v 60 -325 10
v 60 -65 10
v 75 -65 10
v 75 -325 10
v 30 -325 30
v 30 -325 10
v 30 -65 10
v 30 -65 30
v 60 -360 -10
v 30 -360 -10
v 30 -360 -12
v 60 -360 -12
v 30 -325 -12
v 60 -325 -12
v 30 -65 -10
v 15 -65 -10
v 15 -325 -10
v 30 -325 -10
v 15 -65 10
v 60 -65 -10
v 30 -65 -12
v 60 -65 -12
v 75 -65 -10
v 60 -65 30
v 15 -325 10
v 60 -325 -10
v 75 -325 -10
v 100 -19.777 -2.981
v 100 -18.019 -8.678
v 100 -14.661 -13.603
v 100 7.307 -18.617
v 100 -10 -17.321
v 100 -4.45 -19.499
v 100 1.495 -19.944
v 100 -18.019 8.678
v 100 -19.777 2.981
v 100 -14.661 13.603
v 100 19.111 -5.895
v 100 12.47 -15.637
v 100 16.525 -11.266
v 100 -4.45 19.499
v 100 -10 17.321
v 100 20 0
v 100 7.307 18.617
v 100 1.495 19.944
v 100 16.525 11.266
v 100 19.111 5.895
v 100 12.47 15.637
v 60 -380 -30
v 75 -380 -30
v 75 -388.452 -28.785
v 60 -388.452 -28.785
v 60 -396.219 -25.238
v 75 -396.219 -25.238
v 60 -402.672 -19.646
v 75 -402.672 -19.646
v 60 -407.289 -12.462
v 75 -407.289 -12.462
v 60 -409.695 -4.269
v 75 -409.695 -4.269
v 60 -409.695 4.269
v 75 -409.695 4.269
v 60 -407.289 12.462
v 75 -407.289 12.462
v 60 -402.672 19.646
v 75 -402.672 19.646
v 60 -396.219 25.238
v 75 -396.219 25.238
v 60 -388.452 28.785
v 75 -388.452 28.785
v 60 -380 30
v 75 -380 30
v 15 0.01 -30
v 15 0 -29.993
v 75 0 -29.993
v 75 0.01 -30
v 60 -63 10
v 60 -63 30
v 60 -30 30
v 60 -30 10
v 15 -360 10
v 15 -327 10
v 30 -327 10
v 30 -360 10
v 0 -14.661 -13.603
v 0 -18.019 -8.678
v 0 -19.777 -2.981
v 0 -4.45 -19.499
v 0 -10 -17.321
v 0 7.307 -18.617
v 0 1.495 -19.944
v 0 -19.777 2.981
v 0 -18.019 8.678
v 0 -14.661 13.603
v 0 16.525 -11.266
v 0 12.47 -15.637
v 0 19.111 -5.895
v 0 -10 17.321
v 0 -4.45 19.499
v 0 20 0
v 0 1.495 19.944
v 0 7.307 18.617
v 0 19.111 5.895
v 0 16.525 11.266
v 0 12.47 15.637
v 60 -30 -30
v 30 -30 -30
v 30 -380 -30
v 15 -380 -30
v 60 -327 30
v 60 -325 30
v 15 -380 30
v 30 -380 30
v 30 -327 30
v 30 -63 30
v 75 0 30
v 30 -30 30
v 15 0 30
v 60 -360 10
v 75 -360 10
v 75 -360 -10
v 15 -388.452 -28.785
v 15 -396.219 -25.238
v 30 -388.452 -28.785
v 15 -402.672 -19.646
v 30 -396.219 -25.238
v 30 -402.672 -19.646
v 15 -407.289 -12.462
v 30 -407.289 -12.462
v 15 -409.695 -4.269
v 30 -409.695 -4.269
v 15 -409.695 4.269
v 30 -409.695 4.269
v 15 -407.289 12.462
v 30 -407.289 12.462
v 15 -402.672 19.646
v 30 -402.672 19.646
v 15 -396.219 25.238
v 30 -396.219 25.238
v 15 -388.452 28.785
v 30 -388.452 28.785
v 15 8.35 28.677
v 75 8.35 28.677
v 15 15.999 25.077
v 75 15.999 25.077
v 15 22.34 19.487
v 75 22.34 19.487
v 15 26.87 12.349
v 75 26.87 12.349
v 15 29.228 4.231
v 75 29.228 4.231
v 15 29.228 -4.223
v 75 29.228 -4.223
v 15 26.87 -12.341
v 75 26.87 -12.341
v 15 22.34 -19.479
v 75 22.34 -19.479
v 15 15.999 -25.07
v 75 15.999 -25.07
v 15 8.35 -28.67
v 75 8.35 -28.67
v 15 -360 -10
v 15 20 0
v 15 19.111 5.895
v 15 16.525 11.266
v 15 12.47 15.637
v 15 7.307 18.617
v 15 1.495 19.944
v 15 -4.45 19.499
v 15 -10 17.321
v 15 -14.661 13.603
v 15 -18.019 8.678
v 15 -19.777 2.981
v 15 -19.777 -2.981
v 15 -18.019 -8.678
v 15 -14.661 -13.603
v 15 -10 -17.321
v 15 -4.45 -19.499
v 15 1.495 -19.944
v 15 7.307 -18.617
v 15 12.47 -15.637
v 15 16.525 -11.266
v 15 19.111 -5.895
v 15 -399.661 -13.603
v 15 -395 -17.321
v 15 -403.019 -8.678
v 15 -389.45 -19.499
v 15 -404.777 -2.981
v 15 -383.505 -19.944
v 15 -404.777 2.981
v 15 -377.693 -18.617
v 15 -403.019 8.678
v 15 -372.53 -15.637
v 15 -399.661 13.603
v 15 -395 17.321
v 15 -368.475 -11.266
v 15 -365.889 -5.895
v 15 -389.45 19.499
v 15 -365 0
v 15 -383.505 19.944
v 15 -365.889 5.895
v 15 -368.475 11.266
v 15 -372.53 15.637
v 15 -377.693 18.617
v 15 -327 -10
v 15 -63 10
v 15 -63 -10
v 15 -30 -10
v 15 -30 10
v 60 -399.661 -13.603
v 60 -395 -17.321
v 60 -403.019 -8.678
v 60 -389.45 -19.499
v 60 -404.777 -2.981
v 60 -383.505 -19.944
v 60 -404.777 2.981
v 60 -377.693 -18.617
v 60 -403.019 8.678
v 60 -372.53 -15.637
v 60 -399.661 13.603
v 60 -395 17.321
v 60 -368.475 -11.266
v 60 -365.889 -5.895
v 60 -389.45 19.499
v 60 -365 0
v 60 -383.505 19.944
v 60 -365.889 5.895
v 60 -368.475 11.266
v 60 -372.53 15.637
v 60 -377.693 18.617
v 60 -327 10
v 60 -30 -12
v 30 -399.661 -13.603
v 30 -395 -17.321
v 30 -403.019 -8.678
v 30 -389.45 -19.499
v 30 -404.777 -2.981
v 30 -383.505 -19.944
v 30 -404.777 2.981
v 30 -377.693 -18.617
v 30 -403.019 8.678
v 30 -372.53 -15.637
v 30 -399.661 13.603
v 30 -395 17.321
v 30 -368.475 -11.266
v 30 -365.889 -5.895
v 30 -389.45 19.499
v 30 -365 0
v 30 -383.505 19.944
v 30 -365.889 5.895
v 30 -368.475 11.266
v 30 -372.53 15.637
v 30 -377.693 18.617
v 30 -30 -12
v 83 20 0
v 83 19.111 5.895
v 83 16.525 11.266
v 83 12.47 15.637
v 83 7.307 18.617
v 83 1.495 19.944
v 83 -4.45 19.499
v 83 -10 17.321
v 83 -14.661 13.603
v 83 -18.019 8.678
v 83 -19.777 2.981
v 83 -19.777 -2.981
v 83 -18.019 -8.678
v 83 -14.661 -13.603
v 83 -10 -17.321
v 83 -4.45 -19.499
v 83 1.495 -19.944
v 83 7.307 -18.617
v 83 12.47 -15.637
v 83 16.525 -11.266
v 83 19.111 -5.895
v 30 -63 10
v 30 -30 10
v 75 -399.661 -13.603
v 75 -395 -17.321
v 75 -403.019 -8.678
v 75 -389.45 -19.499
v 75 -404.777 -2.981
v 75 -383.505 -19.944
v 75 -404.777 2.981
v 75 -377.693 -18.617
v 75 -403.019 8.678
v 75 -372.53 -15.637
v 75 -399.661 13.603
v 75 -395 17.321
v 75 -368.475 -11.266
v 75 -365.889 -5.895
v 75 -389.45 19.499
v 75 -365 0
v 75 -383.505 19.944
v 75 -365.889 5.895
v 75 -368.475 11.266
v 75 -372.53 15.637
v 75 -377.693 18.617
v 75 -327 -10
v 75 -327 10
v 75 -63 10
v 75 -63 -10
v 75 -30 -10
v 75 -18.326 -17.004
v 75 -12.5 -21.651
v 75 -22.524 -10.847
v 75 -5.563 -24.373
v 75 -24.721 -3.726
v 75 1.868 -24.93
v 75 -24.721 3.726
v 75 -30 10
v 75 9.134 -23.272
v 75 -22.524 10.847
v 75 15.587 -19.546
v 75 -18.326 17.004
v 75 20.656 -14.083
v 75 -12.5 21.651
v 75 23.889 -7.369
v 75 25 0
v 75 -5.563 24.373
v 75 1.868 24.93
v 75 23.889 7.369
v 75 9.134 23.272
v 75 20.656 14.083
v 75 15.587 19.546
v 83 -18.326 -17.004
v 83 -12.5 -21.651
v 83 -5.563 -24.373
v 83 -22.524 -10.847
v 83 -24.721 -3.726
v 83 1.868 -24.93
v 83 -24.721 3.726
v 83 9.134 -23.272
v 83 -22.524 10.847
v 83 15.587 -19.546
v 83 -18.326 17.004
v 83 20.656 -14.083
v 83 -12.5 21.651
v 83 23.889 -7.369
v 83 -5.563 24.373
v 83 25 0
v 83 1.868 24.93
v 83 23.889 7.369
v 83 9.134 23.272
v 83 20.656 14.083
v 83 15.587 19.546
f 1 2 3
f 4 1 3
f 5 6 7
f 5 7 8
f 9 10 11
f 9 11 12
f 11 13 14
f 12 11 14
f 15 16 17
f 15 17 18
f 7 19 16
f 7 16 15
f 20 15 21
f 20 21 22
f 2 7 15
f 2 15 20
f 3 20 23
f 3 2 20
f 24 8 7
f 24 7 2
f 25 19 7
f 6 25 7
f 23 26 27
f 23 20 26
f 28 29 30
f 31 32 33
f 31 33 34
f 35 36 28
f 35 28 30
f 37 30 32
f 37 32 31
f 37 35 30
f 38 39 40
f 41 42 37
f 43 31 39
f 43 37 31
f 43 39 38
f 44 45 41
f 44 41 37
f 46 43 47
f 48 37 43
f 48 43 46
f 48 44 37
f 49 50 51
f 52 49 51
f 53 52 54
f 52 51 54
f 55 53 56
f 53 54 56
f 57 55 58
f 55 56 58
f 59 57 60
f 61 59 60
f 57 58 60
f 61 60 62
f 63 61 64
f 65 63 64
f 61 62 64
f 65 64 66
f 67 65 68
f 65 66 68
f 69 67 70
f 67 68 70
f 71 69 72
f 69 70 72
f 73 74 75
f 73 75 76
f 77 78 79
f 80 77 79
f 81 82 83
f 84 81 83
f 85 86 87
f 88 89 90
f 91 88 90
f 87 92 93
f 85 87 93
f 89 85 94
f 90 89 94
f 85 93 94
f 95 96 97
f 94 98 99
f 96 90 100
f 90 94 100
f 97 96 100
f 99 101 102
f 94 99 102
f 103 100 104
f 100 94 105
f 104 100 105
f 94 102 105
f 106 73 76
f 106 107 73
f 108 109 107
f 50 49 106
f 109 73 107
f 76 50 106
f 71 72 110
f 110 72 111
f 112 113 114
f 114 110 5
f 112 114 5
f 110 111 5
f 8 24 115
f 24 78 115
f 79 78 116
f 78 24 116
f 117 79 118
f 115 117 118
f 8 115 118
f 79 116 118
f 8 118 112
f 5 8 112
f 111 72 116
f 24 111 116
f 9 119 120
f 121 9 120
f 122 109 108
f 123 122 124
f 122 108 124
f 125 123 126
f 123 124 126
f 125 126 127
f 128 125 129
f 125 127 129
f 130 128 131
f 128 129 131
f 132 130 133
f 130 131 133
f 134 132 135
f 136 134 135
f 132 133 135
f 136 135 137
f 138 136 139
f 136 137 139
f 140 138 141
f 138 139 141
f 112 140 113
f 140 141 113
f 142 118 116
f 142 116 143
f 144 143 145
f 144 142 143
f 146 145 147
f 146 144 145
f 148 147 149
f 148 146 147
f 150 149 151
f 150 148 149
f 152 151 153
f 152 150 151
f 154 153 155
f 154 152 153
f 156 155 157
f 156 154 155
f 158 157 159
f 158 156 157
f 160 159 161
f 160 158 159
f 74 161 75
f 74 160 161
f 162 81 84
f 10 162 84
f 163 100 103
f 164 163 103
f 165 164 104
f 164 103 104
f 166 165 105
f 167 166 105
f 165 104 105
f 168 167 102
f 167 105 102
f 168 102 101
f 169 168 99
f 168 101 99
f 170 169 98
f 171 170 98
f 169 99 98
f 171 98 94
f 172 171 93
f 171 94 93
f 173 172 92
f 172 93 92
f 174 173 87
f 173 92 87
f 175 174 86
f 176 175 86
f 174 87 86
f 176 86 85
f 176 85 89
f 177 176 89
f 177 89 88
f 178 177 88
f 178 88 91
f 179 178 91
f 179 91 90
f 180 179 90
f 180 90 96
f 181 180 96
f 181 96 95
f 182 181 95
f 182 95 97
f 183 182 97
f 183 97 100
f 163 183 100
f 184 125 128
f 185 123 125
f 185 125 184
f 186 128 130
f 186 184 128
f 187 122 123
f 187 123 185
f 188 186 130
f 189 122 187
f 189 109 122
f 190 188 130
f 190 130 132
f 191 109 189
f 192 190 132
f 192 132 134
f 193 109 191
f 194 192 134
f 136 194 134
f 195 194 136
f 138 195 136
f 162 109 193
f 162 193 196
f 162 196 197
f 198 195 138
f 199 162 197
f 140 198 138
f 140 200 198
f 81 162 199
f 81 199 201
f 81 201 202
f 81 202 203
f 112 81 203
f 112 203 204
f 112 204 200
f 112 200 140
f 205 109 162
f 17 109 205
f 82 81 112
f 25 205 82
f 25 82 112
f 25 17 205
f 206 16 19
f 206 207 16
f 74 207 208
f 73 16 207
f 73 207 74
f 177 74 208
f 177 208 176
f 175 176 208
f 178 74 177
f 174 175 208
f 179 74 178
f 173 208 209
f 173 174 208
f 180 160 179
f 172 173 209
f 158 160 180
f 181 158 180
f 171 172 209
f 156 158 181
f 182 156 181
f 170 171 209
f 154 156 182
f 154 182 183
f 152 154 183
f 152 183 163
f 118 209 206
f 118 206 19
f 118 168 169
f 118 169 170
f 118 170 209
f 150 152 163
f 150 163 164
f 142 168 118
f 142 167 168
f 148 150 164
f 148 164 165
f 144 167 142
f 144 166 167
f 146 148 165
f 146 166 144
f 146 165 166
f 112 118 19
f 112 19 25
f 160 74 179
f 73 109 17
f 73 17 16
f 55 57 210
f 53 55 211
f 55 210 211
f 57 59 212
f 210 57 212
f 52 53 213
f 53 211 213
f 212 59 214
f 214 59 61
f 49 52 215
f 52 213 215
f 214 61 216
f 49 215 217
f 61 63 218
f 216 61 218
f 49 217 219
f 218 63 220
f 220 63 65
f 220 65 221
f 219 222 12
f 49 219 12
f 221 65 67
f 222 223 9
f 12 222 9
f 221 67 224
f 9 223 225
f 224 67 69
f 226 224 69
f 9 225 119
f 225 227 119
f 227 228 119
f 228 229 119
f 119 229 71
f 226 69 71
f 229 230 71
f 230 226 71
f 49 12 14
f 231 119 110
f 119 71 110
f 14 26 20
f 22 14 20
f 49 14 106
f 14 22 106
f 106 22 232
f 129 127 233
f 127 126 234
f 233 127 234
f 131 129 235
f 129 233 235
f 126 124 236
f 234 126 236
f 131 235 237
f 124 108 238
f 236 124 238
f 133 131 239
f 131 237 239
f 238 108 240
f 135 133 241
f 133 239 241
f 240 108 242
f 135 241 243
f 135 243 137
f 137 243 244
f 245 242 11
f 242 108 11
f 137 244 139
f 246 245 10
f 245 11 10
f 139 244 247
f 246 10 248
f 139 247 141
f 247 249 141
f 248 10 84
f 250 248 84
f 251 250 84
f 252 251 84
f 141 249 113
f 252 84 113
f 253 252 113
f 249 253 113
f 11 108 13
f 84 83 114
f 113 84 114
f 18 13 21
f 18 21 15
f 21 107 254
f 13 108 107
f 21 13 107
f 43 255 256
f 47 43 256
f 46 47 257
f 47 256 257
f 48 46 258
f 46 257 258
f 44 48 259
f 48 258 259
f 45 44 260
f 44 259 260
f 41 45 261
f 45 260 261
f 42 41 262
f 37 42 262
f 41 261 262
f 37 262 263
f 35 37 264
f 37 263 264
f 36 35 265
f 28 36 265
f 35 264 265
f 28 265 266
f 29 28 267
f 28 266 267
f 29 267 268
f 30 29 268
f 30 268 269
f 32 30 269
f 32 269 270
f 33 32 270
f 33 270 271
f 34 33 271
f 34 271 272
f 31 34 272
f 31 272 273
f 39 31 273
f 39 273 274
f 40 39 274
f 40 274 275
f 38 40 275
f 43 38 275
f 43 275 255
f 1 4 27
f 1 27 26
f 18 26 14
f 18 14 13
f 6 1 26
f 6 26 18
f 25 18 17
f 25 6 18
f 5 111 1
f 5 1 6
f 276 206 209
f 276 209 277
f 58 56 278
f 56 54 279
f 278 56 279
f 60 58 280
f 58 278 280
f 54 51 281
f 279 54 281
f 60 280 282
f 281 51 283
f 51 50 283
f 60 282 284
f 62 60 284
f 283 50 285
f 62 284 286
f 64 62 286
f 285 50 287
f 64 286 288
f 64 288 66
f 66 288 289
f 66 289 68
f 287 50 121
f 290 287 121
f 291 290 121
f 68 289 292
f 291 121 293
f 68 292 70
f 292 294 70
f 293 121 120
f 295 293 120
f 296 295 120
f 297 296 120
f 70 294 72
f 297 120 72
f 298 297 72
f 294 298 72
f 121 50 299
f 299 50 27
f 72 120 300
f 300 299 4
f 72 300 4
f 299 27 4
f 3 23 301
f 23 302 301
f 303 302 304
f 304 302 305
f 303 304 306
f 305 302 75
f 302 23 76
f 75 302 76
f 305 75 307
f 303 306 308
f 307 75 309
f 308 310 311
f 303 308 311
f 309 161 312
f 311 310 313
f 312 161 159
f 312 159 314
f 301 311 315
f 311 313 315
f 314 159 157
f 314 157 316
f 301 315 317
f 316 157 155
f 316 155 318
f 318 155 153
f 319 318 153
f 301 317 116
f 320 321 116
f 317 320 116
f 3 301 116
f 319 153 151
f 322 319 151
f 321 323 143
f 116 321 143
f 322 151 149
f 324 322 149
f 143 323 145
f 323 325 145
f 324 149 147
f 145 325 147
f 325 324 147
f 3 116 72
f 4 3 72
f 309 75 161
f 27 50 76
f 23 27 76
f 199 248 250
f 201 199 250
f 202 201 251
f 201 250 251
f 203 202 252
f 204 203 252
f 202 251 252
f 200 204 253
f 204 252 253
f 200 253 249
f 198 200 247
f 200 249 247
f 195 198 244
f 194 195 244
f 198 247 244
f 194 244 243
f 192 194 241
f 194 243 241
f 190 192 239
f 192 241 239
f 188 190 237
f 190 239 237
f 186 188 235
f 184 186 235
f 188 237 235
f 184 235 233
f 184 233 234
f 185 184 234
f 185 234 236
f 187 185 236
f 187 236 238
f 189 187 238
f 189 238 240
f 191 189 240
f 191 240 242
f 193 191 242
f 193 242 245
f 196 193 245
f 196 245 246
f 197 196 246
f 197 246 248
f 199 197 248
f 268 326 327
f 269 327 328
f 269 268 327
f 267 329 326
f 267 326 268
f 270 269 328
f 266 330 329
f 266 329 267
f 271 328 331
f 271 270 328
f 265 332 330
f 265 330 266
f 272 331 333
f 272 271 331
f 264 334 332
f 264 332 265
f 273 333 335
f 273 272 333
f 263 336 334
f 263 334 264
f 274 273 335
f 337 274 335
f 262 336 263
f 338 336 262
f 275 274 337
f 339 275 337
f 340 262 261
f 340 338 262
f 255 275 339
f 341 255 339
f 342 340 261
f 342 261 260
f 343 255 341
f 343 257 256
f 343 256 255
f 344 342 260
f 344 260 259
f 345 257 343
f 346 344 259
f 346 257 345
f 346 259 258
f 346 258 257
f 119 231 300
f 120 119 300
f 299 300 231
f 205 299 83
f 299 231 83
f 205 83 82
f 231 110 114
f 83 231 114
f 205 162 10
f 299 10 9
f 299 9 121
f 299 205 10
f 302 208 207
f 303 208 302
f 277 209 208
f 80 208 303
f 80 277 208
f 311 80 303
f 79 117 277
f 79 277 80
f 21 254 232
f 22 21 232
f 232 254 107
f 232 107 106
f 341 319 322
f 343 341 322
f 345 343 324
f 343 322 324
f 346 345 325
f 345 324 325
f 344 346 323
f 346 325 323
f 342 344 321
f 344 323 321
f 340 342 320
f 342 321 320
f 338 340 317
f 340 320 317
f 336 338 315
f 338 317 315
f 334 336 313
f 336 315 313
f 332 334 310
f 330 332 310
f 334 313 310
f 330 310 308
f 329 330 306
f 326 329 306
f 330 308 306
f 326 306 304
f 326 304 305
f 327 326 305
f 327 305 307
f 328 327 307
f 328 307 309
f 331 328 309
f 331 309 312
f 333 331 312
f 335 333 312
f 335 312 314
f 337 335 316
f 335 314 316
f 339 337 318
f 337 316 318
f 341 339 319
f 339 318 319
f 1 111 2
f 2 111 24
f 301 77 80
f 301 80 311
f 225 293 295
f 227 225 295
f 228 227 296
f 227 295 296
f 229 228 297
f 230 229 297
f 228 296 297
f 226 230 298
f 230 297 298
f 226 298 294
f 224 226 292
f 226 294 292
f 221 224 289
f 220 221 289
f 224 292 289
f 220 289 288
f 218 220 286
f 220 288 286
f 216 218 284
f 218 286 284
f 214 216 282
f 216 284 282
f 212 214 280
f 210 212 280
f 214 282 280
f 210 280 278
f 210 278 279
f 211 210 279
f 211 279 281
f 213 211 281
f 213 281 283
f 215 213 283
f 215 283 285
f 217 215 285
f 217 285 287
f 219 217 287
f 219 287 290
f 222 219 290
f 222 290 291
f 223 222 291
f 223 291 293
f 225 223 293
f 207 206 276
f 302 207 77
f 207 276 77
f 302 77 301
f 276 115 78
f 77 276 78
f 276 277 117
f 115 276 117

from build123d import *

# Parameters (mm, degrees)
F0_R          = 20
F1_DEPTH      = 100
F2_W          = 60
F2_H          = 60
F3_DEPTH      = 30
F3_DEPTH_BACK = 40
F4_W          = 15
F4_H          = 20
F5_DEPTH      = 380
F6_W          = 15
F6_H          = 50
F7_DEPTH      = 50
F8_R          = 20
F9_DEPTH      = 75.001
F11_DEPTH     = 75.001
F13_DEPTH     = 100.001
F14_R         = 25
F15_DEPTH     = 8
F16_W         = 60
F16_H         = 35
F17_DEPTH     = 2
F18_W         = 60
F18_H         = 42
F19_DEPTH     = 2
F20_W         = 60
F20_H         = 35
F21_DEPTH     = 2
F22_W         = 60
F22_H         = 40
F23_DEPTH     = 2


with BuildPart() as f1:
    # F0 (on Right) → F1 (new body)
    with BuildSketch(Plane.YZ):
        Circle(F0_R)
    extrude(amount=F1_DEPTH)

    # F2 (on Front) → F3 (join, two sides)
    with BuildSketch(Plane.XZ) as f3_sk:
        with Locations((45, 0)):
            Rectangle(F2_W, F2_H)
    extrude(amount=F3_DEPTH)
    extrude(f3_sk.sketch, amount=-F3_DEPTH_BACK)

    # F4 (on face) → F5 (join)
    with BuildSketch(Plane.XZ.offset(30)):
        with Locations((67.5, 20)):
            Rectangle(F4_W, F4_H)
        with Locations((22.5, 20)):
            Rectangle(F4_W, F4_H)
        with Locations((22.5, -20)):
            Rectangle(F4_W, F4_H)
        with Locations((67.5, -20)):
            Rectangle(F4_W, F4_H)
    extrude(amount=F5_DEPTH)

    # F6 (on face) → F7 (join)
    with BuildSketch(Plane.XY.offset(30)):
        with Locations((67.5, -385)):
            Rectangle(F6_W, F6_H)
        with Locations((22.5, -385)):
            Rectangle(F6_W, F6_H)
    extrude(amount=-F7_DEPTH)

    # F8 (on face) → F9 (cut, through all)
    with BuildSketch(Plane.YZ.offset(75)):
        with Locations((-385, 0)):
            Circle(F8_R)
    extrude(amount=-F9_DEPTH, mode=Mode.SUBTRACT)

    # F10 (on face) → F11 (cut, through all)
    with BuildSketch(Plane.YZ.offset(75)):
        with BuildLine():
            ThreePointArc((-380, -30), (-410, 0), (-380, 30))
            Line((-380, 30), (-431.153561, 30))
            Line((-431.153561, 30), (-431.153561, -30))
            Line((-431.153561, -30), (-380, -30))
        make_face()
    extrude(amount=-F11_DEPTH, mode=Mode.SUBTRACT)

    # F12 (on Right) → F13 (cut, through all)
    with BuildSketch(Plane.YZ):
        with BuildLine():
            ThreePointArc((0, 30), (29.527362, 0.003723), (0, -29.992553))
            Line((0, -29.992553), (38.263392, -57.712726))
            Line((38.263392, -57.712726), (73.062226, -4.995079))
            Line((73.062226, -4.995079), (49.949568, 52.137349))
            Line((49.949568, 52.137349), (0, 30))
        make_face()
    extrude(amount=F13_DEPTH, mode=Mode.SUBTRACT)

    # F14 (on face) → F15 (join)
    with BuildSketch(Plane.YZ.offset(75)):
        Circle(F14_R)
    extrude(amount=F15_DEPTH)

    # F16 (on face) → F17 (join)
    with BuildSketch(Plane.XY.offset(-10)):
        with Locations((45, -47.5)):
            Rectangle(F16_W, F16_H)
    extrude(amount=-F17_DEPTH)

    # F18 (on face) → F19 (join)
    with BuildSketch(Plane.XZ.offset(65)):
        with Locations((45, 9)):
            Rectangle(F18_W, F18_H)
    extrude(amount=-F19_DEPTH)

    # F20 (on face) → F21 (join)
    with BuildSketch(Plane.XY.offset(-10)):
        with Locations((45, -342.5)):
            Rectangle(F20_W, F20_H)
    extrude(amount=-F21_DEPTH)

    # F22 (on face) → F23 (join)
    with BuildSketch(Plane(origin=(0, -325, 0), x_dir=(-1, 0, 0), z_dir=(0, 1, 0))):
        with Locations((-45, 10)):
            Rectangle(F22_W, F22_H)
    extrude(amount=-F23_DEPTH)


solid = f1.part
